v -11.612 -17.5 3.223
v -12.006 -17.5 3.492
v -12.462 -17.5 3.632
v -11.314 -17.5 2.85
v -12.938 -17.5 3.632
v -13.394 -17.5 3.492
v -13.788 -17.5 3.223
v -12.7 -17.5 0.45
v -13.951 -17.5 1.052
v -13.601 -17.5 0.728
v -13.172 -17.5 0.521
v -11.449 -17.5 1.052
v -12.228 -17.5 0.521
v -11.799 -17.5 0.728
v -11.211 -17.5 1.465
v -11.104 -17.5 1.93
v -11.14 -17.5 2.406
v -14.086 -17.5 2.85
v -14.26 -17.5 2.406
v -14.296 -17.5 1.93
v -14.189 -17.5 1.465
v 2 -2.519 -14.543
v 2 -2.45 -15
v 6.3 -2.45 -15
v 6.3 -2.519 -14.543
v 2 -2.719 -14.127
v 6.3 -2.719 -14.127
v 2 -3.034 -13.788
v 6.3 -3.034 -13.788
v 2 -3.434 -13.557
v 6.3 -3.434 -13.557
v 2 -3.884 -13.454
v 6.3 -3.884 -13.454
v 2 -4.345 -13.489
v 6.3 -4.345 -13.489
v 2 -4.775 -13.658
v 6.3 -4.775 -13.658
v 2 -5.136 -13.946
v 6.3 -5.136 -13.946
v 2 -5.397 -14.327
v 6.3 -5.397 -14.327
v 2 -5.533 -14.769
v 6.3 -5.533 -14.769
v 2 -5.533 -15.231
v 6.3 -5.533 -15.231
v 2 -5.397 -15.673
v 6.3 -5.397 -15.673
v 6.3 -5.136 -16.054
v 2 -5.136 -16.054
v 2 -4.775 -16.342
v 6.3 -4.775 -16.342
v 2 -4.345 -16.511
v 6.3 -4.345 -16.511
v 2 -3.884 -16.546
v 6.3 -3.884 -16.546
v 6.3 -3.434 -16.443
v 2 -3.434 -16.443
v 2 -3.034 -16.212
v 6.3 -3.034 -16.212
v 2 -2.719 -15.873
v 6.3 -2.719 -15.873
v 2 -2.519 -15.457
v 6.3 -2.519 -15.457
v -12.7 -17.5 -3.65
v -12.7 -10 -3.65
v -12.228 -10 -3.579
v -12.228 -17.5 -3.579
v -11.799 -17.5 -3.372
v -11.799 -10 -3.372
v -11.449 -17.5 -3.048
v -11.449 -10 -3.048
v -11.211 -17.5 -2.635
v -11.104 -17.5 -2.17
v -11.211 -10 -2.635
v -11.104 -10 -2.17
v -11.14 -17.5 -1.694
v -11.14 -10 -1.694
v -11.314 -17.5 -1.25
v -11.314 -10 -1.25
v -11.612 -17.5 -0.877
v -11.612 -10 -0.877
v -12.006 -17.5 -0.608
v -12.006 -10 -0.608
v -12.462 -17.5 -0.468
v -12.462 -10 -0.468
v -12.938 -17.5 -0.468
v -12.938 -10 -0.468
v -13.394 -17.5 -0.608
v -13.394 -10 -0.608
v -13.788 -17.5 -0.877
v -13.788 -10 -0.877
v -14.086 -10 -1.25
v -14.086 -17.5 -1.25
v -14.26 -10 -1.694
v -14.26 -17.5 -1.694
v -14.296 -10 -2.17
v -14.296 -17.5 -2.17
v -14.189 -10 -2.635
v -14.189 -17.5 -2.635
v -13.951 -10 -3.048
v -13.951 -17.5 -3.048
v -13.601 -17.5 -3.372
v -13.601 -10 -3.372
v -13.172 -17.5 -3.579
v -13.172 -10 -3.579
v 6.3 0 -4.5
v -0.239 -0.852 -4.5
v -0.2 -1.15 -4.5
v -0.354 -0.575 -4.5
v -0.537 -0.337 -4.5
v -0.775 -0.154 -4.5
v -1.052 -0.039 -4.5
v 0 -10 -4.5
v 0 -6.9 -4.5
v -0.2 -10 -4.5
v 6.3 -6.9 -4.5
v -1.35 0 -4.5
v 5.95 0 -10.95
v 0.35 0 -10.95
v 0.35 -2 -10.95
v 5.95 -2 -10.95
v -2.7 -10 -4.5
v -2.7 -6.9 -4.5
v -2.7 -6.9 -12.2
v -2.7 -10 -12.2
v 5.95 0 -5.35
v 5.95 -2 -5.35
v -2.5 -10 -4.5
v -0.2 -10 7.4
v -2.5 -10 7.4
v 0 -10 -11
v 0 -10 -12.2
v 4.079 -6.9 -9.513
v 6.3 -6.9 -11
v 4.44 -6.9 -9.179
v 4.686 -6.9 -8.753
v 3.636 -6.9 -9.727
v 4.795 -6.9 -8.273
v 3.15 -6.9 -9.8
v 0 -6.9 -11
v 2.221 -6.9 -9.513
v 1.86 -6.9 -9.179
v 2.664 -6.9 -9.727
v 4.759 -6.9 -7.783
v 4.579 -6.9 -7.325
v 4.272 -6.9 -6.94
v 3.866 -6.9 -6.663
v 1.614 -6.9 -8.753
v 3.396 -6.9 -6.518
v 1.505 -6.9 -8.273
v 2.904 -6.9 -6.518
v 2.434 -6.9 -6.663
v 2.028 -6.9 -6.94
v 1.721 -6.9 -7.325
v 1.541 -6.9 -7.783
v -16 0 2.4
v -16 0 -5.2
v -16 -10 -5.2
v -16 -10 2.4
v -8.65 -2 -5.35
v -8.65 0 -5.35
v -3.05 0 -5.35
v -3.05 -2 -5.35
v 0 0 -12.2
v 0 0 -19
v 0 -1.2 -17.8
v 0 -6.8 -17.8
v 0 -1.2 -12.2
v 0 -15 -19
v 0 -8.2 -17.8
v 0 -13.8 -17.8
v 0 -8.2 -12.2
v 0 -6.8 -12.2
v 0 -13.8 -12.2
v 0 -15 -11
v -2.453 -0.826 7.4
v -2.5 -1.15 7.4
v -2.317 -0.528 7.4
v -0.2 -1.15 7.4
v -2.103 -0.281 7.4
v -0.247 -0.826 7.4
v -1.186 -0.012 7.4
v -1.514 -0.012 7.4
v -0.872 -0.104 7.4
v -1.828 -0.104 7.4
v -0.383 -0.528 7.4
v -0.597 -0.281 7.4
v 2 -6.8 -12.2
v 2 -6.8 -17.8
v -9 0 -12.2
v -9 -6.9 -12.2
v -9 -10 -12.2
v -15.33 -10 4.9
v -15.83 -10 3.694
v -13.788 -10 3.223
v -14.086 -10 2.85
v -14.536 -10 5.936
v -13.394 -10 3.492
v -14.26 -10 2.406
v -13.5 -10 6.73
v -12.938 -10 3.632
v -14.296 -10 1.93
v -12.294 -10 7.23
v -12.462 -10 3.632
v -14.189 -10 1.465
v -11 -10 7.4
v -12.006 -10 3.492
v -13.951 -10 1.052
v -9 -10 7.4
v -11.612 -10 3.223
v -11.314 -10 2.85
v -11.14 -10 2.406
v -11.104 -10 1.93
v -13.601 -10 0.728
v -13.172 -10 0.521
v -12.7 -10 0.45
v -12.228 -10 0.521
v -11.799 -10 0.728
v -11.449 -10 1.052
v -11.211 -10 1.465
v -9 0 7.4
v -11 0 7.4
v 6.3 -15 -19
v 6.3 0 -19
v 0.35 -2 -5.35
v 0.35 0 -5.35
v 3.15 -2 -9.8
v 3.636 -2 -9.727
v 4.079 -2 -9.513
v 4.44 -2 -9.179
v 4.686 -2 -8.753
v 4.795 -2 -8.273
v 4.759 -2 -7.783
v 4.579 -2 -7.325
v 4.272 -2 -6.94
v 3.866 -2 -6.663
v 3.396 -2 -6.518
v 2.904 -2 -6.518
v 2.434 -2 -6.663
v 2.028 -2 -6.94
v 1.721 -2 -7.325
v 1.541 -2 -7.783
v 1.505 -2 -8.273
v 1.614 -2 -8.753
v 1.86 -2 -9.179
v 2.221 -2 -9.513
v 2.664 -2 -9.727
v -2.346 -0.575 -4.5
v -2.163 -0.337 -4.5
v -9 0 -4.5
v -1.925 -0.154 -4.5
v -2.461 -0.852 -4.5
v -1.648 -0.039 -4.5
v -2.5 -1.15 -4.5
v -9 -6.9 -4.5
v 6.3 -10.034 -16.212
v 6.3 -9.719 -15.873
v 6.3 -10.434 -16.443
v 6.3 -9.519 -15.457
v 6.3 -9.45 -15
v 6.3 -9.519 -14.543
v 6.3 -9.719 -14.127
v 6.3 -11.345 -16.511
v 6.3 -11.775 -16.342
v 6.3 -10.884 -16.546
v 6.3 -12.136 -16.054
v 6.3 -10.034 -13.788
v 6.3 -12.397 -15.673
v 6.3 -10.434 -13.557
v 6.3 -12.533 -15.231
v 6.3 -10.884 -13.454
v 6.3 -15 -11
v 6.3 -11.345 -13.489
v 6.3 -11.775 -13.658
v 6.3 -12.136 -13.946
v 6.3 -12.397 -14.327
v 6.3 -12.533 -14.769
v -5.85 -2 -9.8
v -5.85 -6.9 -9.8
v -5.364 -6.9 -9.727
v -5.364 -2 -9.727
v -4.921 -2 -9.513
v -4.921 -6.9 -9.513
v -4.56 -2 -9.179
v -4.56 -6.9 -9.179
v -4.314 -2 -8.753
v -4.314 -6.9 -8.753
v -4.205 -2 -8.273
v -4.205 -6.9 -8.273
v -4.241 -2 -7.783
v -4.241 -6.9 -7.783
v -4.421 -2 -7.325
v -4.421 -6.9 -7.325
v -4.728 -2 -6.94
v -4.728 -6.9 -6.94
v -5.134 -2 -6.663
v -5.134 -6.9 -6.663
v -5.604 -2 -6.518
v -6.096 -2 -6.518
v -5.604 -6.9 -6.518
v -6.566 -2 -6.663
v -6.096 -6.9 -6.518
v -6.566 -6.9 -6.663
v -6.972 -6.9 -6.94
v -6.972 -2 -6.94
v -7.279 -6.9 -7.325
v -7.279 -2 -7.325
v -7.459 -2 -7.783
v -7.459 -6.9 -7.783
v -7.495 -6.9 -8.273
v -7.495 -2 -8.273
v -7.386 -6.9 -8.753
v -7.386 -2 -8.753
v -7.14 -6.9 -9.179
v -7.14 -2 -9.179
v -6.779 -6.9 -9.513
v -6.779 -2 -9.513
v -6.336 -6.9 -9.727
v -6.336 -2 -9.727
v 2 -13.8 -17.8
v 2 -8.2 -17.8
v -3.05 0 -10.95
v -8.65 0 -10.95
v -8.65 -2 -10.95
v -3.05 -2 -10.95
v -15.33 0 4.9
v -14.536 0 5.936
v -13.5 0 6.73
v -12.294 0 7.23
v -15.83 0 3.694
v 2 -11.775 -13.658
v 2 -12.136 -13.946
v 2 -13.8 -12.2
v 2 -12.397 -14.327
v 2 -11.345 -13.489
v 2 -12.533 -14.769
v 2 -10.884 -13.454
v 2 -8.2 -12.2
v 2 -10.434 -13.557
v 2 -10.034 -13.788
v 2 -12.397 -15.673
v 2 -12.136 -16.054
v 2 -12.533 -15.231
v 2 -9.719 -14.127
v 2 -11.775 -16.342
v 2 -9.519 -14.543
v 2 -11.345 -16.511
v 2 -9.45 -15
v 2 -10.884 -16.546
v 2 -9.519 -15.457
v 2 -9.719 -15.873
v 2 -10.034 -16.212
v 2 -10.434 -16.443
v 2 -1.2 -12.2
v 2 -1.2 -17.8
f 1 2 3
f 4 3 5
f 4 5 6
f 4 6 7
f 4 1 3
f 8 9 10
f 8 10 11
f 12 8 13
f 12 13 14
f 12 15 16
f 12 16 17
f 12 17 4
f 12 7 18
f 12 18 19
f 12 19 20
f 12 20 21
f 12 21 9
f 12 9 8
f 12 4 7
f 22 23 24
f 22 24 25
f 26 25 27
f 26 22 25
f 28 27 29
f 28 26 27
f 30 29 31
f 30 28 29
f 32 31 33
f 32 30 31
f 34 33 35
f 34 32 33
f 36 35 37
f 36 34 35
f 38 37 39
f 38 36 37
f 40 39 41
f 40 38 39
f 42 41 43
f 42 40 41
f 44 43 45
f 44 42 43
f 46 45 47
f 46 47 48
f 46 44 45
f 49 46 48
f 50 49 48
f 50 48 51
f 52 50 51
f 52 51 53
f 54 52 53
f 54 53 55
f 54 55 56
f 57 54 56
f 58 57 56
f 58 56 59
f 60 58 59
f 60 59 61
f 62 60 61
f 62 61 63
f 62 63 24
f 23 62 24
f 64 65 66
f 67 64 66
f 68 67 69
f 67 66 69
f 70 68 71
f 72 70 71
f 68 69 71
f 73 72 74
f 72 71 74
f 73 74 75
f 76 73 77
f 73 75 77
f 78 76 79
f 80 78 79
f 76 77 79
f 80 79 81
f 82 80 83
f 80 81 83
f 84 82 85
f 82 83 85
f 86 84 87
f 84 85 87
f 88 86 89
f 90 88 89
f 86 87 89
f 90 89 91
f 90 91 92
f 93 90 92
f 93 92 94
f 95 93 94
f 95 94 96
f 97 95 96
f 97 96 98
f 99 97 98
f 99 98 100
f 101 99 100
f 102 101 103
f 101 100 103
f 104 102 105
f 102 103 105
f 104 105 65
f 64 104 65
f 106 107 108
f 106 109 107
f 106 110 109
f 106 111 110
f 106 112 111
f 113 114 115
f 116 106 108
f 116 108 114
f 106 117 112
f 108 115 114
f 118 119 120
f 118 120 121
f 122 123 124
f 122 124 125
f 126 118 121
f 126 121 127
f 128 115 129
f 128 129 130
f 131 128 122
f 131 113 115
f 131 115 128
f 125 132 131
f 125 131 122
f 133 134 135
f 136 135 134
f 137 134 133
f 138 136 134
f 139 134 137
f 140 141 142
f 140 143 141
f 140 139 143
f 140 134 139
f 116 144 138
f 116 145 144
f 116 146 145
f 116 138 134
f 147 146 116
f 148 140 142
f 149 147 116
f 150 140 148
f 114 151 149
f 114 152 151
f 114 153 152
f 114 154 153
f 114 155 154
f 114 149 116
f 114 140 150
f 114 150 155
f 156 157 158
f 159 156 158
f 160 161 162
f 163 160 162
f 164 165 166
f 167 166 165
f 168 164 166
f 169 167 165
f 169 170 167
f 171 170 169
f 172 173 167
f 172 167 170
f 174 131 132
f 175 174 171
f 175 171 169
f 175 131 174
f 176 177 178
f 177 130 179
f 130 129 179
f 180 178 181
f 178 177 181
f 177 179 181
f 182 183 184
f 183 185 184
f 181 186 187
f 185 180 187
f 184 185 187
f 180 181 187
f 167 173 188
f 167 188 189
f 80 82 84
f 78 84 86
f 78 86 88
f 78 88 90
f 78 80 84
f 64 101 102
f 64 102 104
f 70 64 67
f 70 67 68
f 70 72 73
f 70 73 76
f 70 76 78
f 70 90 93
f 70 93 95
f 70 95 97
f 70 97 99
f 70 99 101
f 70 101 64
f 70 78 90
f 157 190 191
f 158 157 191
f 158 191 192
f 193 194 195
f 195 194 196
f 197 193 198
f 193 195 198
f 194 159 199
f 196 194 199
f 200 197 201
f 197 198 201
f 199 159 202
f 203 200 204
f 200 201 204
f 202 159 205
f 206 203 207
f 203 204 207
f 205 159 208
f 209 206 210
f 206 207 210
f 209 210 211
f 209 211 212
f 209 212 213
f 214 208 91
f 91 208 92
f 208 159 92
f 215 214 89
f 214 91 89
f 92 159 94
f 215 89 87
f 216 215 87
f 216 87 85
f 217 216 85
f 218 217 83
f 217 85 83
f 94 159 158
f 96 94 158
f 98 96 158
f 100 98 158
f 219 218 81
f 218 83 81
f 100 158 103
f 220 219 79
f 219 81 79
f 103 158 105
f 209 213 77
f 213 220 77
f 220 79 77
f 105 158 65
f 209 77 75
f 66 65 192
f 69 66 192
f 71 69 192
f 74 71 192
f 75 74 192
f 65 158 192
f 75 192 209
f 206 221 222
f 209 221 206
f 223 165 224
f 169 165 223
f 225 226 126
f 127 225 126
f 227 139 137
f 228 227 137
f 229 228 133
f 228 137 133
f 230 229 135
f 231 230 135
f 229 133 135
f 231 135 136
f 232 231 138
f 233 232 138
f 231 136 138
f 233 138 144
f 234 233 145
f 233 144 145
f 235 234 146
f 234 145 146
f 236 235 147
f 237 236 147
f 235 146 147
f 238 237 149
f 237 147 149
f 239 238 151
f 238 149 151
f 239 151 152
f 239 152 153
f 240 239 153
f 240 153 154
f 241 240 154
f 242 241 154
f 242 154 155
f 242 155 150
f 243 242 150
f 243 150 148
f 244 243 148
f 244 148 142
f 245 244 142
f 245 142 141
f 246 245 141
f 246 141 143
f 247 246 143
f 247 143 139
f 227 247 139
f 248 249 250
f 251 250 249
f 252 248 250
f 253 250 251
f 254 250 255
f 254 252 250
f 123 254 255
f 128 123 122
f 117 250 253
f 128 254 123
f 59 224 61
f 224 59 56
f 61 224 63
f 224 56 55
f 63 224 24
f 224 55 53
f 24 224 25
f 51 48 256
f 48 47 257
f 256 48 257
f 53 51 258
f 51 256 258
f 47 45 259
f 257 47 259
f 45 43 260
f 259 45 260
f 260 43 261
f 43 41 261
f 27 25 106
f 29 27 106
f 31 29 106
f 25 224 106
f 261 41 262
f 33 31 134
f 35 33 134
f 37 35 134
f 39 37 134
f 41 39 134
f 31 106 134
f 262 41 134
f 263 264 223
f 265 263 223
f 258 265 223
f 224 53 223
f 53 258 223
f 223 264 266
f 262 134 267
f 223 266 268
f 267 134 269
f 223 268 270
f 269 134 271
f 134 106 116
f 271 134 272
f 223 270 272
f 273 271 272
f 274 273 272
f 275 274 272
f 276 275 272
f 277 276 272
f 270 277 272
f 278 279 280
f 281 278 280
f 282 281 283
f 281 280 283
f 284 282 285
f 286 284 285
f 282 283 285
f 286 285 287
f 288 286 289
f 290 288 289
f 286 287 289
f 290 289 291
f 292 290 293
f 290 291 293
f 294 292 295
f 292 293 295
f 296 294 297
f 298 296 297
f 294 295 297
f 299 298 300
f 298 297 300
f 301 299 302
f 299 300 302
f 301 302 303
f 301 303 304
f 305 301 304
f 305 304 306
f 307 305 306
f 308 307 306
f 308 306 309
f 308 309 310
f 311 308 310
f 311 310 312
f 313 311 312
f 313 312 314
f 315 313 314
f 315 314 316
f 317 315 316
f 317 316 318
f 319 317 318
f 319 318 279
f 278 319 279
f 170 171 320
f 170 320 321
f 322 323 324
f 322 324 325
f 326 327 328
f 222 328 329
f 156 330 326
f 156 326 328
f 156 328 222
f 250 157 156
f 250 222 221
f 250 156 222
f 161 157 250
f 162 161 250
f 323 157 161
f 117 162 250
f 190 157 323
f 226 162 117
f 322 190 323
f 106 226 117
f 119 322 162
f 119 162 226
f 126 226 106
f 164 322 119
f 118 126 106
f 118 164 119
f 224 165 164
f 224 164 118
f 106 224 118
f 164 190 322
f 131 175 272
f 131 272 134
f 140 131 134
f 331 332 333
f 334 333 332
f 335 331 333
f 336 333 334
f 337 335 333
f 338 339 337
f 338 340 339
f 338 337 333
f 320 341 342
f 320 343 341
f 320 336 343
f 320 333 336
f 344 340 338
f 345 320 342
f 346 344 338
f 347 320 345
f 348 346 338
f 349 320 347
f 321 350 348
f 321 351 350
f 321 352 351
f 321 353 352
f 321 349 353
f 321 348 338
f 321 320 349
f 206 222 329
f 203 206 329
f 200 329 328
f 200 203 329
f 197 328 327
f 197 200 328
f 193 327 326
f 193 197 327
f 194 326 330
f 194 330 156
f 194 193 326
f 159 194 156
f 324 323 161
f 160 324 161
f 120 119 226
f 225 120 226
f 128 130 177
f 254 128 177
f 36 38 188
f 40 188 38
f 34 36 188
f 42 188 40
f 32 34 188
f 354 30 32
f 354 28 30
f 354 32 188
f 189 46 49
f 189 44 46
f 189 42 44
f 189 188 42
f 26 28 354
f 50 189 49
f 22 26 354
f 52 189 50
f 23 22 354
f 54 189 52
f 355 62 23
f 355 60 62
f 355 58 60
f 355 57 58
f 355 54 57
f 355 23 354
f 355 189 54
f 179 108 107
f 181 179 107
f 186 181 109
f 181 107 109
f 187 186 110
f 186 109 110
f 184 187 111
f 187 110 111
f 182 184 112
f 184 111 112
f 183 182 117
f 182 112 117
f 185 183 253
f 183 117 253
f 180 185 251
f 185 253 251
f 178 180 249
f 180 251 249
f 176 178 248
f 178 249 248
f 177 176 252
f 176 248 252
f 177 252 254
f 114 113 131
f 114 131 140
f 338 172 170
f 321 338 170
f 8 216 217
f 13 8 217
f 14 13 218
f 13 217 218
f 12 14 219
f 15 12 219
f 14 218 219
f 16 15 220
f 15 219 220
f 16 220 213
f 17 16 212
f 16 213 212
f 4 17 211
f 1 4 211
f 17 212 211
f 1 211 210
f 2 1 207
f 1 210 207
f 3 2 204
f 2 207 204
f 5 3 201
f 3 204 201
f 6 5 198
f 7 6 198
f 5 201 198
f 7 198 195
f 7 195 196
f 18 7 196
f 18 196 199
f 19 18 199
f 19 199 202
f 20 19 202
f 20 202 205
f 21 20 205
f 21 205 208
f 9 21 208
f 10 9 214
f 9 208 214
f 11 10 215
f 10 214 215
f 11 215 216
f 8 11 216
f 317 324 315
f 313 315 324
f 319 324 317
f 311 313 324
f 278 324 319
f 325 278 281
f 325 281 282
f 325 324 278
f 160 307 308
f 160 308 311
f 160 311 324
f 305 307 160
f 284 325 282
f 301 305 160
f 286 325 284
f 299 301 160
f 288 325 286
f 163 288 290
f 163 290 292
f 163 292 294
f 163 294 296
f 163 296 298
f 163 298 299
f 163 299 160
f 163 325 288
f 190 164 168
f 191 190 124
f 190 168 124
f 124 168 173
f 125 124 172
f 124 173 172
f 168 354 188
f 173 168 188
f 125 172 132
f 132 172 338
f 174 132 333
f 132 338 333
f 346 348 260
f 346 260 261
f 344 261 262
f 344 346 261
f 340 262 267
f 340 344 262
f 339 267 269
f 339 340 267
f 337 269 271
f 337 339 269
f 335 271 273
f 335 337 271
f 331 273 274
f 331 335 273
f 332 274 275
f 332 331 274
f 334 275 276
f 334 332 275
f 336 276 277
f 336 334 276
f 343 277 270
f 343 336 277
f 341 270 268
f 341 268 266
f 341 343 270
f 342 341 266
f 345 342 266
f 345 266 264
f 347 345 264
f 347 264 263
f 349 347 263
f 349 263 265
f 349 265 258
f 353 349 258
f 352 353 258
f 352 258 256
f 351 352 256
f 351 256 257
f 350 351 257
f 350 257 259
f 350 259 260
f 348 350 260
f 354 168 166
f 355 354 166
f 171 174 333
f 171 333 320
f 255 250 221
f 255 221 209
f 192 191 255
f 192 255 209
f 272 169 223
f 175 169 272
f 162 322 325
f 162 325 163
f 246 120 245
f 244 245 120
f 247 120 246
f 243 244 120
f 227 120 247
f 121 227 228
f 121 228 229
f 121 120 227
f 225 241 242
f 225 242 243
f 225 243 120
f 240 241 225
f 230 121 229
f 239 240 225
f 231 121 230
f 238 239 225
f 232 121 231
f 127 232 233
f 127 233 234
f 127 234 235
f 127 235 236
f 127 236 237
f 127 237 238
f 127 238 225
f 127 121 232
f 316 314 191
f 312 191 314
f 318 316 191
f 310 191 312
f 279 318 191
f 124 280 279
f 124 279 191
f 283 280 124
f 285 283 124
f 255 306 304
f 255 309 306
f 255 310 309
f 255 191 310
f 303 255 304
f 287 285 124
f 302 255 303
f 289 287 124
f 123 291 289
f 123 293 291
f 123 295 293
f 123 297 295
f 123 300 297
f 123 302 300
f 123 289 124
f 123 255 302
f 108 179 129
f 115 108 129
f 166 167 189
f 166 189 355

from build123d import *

# Parameters (mm, degrees)
SKETCH_R        = 1.55
PAD_DEPTH       = 6.3
SKETCH002_W     = 5.6
SKETCH002_H     = 5.6
POCKET_DEPTH    = 2
PAD001_DEPTH    = 7.7
SKETCH003_R     = 1.65
POCKET001_DEPTH = 6.901
SKETCH004_W     = 5.6
SKETCH004_H     = 5.6
POCKET002_DEPTH = 2
SKETCH005_W     = 10
SKETCH005_H     = 7
PAD002_DEPTH    = 11.9
SKETCH006_R     = 1.6
PAD003_DEPTH    = 7.5
PAD004_DEPTH    = 11.9
FILLET_R        = 5
CHAMFER_SIZE    = 7


with BuildPart() as part:
    # Sketch → Pad (new body)
    with BuildSketch(Plane.YZ):
        Polygon((-6.9, -4.5), (0, -4.5), (0, -19), (-15, -19), (-15, -11), (-6.9, -11), align=None)
        with Locations((-11, -15)):
            Circle(SKETCH_R, mode=Mode.SUBTRACT)
        with Locations((-4, -15)):
            Circle(SKETCH_R, mode=Mode.SUBTRACT)
    extrude(amount=PAD_DEPTH)

    # Sketch002 (on Face9 of Pad) → Pocket (cut)
    with BuildSketch(Plane(origin=(0, 0, 0), x_dir=(0, 1, 0), z_dir=(-1, 0, 0))):
        with Locations((-4, 15)):
            Rectangle(SKETCH002_W, SKETCH002_H)
        with Locations((-11, 15)):
            Rectangle(SKETCH002_W, SKETCH002_H)
    extrude(amount=-POCKET_DEPTH, mode=Mode.SUBTRACT)

    # Sketch001 (on Face1 of Pad) → Pad001 (join)
    with BuildSketch(Plane(origin=(0, 0, -4.5), x_dir=(0, -1, 0), z_dir=(0, 0, 1))):
        Polygon((0, 0), (0, -16), (10, -16), (10, -9), (6.9, -9), (6.9, -2.7), (10, -2.7), (10, 0), align=None)
    extrude(amount=-PAD001_DEPTH)

    # Sketch003 (on Face1 of Pad001) → Pocket001 (cut, through all)
    with BuildSketch(Plane(origin=(0, -6.9, 0), x_dir=(0, 0, -1), z_dir=(0, -1, 0))):
        with Locations((8.15, -5.85)):
            Circle(SKETCH003_R)
        with Locations((8.15, 3.15)):
            Circle(SKETCH003_R)
    extrude(amount=-POCKET001_DEPTH, mode=Mode.SUBTRACT)

    # Sketch004 (on Face10 of Pocket001) → Pocket002 (cut)
    with BuildSketch(Plane.ZX):
        with Locations((-8.15, 3.15)):
            Rectangle(SKETCH004_W, SKETCH004_H)
        with Locations((-8.15, -5.85)):
            Rectangle(SKETCH004_W, SKETCH004_H)
    extrude(amount=-POCKET002_DEPTH, mode=Mode.SUBTRACT)

    # Sketch005 (on Face5 of Pocket002) → Pad002 (join)
    with BuildSketch(Plane(origin=(0, 0, -4.5), x_dir=(0, -1, 0), z_dir=(0, 0, 1))):
        with Locations((5, -12.5)):
            Rectangle(SKETCH005_W, SKETCH005_H)
    extrude(amount=PAD002_DEPTH)

    # Sketch006 (on Face35 of Pad002) → Pad003 (join)
    with BuildSketch(Plane(origin=(0, -10, 0), x_dir=(0, 0, -1), z_dir=(0, -1, 0))):
        with Locations((-2.05, -12.7)):
            Circle(SKETCH006_R)
        with Locations((2.05, -12.7)):
            Circle(SKETCH006_R)
    extrude(amount=PAD003_DEPTH)

    # Sketch007 (on Face7 of Pad003) → Pad004 (join)
    with BuildSketch(Plane(origin=(0, 0, -4.5), x_dir=(0, -1, 0), z_dir=(0, 0, 1))):
        with BuildLine():
            Line((10, -2.5), (1.15, -2.5))
            ThreePointArc((1.15, -0.2), (0, -1.35), (1.15, -2.5))
            Line((1.15, -0.2), (10, -0.2))
            Line((10, -0.2), (10, -2.5))
        make_face()
    extrude(amount=PAD004_DEPTH)

    # Fillet
    fillet_edges = [part.edges().sort_by_distance(p)[0] for p in [
        (-16, -5, 7.4),
    ]]
    fillet(fillet_edges, radius=FILLET_R)

    # Chamfer
    chamfer_edges = [part.edges().sort_by_distance(p)[0] for p in [
        (-16, -5, -12.2),
    ]]
    chamfer(chamfer_edges, length=CHAMFER_SIZE)


solid = part.part
